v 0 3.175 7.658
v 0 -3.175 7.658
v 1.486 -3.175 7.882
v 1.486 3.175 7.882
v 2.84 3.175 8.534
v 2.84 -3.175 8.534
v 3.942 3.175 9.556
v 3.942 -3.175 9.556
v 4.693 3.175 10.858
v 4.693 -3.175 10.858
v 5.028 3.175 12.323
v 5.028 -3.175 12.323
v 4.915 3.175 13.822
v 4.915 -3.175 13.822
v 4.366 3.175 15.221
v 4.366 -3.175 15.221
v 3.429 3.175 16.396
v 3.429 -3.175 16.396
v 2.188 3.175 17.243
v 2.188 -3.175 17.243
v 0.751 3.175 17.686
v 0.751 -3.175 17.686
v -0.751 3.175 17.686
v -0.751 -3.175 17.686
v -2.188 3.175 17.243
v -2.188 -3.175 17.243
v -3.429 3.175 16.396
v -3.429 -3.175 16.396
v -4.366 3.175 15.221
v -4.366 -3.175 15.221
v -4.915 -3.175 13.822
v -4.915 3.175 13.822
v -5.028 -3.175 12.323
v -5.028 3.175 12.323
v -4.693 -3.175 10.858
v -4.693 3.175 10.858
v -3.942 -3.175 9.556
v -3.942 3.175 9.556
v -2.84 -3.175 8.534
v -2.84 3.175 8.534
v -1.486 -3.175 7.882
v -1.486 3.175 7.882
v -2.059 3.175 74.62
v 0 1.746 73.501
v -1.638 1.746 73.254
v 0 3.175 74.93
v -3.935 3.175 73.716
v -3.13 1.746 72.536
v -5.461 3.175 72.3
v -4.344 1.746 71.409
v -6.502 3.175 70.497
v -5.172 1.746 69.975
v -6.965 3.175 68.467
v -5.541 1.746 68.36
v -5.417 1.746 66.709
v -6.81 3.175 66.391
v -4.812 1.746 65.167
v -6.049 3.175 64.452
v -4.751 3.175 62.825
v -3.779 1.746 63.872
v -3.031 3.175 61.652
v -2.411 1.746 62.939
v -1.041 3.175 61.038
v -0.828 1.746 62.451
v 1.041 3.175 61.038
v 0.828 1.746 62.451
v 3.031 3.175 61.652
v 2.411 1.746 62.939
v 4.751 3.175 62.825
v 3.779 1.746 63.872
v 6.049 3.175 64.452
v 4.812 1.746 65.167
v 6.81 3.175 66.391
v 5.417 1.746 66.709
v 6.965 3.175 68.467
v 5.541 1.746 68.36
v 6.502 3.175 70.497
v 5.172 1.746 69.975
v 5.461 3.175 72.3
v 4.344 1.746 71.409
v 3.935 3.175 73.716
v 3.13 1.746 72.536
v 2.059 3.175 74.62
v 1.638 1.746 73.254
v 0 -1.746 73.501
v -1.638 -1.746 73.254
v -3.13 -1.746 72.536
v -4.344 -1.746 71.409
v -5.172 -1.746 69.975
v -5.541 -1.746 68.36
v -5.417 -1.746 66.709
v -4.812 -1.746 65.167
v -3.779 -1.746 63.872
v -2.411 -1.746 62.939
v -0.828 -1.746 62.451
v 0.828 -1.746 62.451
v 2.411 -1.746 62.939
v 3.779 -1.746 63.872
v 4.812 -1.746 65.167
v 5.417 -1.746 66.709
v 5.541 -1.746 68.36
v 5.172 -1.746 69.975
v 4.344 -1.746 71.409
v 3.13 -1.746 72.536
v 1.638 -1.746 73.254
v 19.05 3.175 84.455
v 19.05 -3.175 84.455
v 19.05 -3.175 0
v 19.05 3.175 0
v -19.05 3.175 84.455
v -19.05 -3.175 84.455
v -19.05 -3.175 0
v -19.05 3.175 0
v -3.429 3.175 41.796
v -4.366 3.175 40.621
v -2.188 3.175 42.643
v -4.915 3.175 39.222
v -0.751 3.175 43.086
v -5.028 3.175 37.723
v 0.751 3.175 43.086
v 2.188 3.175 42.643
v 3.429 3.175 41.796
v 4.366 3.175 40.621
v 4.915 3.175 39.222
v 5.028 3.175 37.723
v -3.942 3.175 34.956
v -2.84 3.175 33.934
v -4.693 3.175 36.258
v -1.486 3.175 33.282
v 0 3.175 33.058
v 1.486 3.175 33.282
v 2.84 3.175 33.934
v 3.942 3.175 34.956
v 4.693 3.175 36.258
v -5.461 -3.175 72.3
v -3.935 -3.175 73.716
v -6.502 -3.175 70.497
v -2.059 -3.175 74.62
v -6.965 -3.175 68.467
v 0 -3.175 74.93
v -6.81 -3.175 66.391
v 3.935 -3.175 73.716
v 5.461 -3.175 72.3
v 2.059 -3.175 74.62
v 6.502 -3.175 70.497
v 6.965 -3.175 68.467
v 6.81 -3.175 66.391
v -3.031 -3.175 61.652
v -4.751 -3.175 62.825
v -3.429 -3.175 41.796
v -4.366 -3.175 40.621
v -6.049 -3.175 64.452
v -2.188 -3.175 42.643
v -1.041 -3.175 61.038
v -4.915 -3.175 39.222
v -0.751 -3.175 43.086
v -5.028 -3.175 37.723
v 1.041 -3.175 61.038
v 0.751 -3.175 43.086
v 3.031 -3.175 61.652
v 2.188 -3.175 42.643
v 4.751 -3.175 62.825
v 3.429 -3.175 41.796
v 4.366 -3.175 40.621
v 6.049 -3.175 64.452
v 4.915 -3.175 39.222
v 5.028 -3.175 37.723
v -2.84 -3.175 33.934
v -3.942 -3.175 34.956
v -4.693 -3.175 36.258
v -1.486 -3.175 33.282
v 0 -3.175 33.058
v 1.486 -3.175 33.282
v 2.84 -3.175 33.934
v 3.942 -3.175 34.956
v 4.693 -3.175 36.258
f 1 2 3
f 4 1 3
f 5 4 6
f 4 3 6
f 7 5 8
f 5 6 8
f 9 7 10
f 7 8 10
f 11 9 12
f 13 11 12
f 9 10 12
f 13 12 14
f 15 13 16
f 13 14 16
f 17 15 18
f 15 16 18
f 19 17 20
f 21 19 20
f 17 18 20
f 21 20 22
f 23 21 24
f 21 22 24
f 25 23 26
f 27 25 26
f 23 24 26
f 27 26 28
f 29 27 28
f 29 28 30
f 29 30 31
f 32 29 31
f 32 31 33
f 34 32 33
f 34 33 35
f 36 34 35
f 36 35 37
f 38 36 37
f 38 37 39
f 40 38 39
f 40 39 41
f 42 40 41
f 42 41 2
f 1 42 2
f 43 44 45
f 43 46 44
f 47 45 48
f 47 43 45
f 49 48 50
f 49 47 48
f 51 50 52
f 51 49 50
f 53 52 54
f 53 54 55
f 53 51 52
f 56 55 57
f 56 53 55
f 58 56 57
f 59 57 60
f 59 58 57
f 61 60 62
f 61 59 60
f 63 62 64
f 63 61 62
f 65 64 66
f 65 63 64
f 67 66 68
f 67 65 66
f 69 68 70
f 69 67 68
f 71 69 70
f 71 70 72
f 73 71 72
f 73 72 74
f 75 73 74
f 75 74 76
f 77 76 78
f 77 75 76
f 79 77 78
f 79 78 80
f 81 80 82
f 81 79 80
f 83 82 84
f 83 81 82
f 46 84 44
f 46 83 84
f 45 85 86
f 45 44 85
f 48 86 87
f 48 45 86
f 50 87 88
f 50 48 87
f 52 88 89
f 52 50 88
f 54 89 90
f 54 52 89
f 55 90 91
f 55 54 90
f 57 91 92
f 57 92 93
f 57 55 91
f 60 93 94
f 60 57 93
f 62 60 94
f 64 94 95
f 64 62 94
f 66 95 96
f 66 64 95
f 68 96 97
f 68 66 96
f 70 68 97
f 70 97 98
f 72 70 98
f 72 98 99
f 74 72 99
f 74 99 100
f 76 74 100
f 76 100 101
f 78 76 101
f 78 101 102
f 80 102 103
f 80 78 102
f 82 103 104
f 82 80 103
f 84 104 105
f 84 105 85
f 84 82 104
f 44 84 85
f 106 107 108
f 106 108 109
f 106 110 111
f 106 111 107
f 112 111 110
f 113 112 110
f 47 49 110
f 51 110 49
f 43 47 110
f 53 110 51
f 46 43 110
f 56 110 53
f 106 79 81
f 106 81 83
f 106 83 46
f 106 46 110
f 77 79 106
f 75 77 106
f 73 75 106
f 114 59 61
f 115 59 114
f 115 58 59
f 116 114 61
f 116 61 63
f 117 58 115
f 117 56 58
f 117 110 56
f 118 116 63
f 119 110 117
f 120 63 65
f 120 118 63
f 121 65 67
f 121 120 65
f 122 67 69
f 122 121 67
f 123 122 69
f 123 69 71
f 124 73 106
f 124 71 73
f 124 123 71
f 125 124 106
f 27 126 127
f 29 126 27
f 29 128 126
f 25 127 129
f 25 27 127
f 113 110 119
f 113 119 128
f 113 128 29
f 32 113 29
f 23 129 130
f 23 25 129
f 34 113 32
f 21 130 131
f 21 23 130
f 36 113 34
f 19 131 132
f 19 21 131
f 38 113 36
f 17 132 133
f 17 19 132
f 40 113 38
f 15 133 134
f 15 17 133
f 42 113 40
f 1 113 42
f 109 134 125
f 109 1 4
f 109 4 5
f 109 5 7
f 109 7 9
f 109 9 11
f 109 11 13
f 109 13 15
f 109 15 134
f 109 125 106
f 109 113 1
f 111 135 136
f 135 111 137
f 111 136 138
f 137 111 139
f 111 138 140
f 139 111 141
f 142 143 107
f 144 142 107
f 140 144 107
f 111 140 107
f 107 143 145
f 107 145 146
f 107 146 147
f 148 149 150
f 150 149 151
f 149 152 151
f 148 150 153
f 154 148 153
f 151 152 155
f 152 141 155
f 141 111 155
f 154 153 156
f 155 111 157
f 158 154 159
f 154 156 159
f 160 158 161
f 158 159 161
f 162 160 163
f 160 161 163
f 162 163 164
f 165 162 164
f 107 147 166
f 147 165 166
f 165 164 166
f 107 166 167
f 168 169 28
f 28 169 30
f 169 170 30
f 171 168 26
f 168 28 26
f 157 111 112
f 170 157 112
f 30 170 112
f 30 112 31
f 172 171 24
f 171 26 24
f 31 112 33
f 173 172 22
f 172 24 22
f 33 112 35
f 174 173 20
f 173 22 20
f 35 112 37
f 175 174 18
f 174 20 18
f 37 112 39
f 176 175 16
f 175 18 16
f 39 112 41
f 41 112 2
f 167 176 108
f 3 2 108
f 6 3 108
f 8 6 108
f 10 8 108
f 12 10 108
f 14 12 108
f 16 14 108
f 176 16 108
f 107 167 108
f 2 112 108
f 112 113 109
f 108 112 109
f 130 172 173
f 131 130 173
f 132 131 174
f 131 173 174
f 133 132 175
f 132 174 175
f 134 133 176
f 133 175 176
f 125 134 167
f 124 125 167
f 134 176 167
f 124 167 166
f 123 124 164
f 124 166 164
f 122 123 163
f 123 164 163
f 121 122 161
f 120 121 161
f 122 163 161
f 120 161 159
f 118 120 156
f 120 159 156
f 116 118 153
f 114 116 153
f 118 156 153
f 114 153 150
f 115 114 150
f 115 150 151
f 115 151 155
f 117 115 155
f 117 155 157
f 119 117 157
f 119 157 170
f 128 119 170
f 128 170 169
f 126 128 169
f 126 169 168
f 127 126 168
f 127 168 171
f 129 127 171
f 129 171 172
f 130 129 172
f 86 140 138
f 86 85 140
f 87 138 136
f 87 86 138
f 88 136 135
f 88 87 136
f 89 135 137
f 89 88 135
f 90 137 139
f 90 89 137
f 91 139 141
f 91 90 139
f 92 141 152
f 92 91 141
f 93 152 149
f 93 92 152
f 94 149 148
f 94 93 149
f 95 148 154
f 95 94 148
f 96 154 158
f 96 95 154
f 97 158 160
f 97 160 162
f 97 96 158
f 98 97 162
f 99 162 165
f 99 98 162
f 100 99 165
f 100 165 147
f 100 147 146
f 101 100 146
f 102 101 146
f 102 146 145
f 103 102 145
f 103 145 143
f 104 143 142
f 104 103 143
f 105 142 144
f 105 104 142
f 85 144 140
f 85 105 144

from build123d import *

# Parameters (mm, degrees)
SKETCH1_W                   = 38.1
SKETCH1_H                   = 6.35
EXTRUDE1_DEPTH              = 84.455
F_3_8_CLEARANCE_HOLE1_D     = 10.0838
F_3_8_CLEARANCE_HOLE1_DEPTH = 16.002
F_3_8_CLEARANCE_HOLE1_TIP   = 3.029479155


with BuildPart() as part:
    # Sketch1 → Extrude1 (new body)
    with BuildSketch(Plane.XY):
        Rectangle(SKETCH1_W, SKETCH1_H)
    extrude(amount=EXTRUDE1_DEPTH)

    # 3/8 Clearance Hole1
    with Locations(Plane(origin=(0, 3.175, 12.7), x_dir=(0, 0, 1), z_dir=(0, 1, 0))):
        with Locations((0, 0), (25.4, 0)):
            Hole(F_3_8_CLEARANCE_HOLE1_D / 2, depth=F_3_8_CLEARANCE_HOLE1_DEPTH)
            with Locations((0, 0, -(F_3_8_CLEARANCE_HOLE1_DEPTH + F_3_8_CLEARANCE_HOLE1_TIP / 2))):  # 118° drill point
                Cone(0, F_3_8_CLEARANCE_HOLE1_D / 2, F_3_8_CLEARANCE_HOLE1_TIP, mode=Mode.SUBTRACT)

    # Sketch4 → 7/16 (0.4375) Diameter Hole2 (revolve, cut)
    with BuildSketch(Plane(origin=(0, 3.175, 67.945), x_dir=(0, 0, 1), z_dir=(1, 0, 0))):
        Polygon((0, 0), (0, 6.35), (6.985, 6.35), (5.55625, 4.92125), (5.55625, 1.42875), (6.985, 0), align=None)
    revolve(axis=Axis((0, 9.525, 67.945), (0, -1, 0)), mode=Mode.SUBTRACT)


solid = part.part
